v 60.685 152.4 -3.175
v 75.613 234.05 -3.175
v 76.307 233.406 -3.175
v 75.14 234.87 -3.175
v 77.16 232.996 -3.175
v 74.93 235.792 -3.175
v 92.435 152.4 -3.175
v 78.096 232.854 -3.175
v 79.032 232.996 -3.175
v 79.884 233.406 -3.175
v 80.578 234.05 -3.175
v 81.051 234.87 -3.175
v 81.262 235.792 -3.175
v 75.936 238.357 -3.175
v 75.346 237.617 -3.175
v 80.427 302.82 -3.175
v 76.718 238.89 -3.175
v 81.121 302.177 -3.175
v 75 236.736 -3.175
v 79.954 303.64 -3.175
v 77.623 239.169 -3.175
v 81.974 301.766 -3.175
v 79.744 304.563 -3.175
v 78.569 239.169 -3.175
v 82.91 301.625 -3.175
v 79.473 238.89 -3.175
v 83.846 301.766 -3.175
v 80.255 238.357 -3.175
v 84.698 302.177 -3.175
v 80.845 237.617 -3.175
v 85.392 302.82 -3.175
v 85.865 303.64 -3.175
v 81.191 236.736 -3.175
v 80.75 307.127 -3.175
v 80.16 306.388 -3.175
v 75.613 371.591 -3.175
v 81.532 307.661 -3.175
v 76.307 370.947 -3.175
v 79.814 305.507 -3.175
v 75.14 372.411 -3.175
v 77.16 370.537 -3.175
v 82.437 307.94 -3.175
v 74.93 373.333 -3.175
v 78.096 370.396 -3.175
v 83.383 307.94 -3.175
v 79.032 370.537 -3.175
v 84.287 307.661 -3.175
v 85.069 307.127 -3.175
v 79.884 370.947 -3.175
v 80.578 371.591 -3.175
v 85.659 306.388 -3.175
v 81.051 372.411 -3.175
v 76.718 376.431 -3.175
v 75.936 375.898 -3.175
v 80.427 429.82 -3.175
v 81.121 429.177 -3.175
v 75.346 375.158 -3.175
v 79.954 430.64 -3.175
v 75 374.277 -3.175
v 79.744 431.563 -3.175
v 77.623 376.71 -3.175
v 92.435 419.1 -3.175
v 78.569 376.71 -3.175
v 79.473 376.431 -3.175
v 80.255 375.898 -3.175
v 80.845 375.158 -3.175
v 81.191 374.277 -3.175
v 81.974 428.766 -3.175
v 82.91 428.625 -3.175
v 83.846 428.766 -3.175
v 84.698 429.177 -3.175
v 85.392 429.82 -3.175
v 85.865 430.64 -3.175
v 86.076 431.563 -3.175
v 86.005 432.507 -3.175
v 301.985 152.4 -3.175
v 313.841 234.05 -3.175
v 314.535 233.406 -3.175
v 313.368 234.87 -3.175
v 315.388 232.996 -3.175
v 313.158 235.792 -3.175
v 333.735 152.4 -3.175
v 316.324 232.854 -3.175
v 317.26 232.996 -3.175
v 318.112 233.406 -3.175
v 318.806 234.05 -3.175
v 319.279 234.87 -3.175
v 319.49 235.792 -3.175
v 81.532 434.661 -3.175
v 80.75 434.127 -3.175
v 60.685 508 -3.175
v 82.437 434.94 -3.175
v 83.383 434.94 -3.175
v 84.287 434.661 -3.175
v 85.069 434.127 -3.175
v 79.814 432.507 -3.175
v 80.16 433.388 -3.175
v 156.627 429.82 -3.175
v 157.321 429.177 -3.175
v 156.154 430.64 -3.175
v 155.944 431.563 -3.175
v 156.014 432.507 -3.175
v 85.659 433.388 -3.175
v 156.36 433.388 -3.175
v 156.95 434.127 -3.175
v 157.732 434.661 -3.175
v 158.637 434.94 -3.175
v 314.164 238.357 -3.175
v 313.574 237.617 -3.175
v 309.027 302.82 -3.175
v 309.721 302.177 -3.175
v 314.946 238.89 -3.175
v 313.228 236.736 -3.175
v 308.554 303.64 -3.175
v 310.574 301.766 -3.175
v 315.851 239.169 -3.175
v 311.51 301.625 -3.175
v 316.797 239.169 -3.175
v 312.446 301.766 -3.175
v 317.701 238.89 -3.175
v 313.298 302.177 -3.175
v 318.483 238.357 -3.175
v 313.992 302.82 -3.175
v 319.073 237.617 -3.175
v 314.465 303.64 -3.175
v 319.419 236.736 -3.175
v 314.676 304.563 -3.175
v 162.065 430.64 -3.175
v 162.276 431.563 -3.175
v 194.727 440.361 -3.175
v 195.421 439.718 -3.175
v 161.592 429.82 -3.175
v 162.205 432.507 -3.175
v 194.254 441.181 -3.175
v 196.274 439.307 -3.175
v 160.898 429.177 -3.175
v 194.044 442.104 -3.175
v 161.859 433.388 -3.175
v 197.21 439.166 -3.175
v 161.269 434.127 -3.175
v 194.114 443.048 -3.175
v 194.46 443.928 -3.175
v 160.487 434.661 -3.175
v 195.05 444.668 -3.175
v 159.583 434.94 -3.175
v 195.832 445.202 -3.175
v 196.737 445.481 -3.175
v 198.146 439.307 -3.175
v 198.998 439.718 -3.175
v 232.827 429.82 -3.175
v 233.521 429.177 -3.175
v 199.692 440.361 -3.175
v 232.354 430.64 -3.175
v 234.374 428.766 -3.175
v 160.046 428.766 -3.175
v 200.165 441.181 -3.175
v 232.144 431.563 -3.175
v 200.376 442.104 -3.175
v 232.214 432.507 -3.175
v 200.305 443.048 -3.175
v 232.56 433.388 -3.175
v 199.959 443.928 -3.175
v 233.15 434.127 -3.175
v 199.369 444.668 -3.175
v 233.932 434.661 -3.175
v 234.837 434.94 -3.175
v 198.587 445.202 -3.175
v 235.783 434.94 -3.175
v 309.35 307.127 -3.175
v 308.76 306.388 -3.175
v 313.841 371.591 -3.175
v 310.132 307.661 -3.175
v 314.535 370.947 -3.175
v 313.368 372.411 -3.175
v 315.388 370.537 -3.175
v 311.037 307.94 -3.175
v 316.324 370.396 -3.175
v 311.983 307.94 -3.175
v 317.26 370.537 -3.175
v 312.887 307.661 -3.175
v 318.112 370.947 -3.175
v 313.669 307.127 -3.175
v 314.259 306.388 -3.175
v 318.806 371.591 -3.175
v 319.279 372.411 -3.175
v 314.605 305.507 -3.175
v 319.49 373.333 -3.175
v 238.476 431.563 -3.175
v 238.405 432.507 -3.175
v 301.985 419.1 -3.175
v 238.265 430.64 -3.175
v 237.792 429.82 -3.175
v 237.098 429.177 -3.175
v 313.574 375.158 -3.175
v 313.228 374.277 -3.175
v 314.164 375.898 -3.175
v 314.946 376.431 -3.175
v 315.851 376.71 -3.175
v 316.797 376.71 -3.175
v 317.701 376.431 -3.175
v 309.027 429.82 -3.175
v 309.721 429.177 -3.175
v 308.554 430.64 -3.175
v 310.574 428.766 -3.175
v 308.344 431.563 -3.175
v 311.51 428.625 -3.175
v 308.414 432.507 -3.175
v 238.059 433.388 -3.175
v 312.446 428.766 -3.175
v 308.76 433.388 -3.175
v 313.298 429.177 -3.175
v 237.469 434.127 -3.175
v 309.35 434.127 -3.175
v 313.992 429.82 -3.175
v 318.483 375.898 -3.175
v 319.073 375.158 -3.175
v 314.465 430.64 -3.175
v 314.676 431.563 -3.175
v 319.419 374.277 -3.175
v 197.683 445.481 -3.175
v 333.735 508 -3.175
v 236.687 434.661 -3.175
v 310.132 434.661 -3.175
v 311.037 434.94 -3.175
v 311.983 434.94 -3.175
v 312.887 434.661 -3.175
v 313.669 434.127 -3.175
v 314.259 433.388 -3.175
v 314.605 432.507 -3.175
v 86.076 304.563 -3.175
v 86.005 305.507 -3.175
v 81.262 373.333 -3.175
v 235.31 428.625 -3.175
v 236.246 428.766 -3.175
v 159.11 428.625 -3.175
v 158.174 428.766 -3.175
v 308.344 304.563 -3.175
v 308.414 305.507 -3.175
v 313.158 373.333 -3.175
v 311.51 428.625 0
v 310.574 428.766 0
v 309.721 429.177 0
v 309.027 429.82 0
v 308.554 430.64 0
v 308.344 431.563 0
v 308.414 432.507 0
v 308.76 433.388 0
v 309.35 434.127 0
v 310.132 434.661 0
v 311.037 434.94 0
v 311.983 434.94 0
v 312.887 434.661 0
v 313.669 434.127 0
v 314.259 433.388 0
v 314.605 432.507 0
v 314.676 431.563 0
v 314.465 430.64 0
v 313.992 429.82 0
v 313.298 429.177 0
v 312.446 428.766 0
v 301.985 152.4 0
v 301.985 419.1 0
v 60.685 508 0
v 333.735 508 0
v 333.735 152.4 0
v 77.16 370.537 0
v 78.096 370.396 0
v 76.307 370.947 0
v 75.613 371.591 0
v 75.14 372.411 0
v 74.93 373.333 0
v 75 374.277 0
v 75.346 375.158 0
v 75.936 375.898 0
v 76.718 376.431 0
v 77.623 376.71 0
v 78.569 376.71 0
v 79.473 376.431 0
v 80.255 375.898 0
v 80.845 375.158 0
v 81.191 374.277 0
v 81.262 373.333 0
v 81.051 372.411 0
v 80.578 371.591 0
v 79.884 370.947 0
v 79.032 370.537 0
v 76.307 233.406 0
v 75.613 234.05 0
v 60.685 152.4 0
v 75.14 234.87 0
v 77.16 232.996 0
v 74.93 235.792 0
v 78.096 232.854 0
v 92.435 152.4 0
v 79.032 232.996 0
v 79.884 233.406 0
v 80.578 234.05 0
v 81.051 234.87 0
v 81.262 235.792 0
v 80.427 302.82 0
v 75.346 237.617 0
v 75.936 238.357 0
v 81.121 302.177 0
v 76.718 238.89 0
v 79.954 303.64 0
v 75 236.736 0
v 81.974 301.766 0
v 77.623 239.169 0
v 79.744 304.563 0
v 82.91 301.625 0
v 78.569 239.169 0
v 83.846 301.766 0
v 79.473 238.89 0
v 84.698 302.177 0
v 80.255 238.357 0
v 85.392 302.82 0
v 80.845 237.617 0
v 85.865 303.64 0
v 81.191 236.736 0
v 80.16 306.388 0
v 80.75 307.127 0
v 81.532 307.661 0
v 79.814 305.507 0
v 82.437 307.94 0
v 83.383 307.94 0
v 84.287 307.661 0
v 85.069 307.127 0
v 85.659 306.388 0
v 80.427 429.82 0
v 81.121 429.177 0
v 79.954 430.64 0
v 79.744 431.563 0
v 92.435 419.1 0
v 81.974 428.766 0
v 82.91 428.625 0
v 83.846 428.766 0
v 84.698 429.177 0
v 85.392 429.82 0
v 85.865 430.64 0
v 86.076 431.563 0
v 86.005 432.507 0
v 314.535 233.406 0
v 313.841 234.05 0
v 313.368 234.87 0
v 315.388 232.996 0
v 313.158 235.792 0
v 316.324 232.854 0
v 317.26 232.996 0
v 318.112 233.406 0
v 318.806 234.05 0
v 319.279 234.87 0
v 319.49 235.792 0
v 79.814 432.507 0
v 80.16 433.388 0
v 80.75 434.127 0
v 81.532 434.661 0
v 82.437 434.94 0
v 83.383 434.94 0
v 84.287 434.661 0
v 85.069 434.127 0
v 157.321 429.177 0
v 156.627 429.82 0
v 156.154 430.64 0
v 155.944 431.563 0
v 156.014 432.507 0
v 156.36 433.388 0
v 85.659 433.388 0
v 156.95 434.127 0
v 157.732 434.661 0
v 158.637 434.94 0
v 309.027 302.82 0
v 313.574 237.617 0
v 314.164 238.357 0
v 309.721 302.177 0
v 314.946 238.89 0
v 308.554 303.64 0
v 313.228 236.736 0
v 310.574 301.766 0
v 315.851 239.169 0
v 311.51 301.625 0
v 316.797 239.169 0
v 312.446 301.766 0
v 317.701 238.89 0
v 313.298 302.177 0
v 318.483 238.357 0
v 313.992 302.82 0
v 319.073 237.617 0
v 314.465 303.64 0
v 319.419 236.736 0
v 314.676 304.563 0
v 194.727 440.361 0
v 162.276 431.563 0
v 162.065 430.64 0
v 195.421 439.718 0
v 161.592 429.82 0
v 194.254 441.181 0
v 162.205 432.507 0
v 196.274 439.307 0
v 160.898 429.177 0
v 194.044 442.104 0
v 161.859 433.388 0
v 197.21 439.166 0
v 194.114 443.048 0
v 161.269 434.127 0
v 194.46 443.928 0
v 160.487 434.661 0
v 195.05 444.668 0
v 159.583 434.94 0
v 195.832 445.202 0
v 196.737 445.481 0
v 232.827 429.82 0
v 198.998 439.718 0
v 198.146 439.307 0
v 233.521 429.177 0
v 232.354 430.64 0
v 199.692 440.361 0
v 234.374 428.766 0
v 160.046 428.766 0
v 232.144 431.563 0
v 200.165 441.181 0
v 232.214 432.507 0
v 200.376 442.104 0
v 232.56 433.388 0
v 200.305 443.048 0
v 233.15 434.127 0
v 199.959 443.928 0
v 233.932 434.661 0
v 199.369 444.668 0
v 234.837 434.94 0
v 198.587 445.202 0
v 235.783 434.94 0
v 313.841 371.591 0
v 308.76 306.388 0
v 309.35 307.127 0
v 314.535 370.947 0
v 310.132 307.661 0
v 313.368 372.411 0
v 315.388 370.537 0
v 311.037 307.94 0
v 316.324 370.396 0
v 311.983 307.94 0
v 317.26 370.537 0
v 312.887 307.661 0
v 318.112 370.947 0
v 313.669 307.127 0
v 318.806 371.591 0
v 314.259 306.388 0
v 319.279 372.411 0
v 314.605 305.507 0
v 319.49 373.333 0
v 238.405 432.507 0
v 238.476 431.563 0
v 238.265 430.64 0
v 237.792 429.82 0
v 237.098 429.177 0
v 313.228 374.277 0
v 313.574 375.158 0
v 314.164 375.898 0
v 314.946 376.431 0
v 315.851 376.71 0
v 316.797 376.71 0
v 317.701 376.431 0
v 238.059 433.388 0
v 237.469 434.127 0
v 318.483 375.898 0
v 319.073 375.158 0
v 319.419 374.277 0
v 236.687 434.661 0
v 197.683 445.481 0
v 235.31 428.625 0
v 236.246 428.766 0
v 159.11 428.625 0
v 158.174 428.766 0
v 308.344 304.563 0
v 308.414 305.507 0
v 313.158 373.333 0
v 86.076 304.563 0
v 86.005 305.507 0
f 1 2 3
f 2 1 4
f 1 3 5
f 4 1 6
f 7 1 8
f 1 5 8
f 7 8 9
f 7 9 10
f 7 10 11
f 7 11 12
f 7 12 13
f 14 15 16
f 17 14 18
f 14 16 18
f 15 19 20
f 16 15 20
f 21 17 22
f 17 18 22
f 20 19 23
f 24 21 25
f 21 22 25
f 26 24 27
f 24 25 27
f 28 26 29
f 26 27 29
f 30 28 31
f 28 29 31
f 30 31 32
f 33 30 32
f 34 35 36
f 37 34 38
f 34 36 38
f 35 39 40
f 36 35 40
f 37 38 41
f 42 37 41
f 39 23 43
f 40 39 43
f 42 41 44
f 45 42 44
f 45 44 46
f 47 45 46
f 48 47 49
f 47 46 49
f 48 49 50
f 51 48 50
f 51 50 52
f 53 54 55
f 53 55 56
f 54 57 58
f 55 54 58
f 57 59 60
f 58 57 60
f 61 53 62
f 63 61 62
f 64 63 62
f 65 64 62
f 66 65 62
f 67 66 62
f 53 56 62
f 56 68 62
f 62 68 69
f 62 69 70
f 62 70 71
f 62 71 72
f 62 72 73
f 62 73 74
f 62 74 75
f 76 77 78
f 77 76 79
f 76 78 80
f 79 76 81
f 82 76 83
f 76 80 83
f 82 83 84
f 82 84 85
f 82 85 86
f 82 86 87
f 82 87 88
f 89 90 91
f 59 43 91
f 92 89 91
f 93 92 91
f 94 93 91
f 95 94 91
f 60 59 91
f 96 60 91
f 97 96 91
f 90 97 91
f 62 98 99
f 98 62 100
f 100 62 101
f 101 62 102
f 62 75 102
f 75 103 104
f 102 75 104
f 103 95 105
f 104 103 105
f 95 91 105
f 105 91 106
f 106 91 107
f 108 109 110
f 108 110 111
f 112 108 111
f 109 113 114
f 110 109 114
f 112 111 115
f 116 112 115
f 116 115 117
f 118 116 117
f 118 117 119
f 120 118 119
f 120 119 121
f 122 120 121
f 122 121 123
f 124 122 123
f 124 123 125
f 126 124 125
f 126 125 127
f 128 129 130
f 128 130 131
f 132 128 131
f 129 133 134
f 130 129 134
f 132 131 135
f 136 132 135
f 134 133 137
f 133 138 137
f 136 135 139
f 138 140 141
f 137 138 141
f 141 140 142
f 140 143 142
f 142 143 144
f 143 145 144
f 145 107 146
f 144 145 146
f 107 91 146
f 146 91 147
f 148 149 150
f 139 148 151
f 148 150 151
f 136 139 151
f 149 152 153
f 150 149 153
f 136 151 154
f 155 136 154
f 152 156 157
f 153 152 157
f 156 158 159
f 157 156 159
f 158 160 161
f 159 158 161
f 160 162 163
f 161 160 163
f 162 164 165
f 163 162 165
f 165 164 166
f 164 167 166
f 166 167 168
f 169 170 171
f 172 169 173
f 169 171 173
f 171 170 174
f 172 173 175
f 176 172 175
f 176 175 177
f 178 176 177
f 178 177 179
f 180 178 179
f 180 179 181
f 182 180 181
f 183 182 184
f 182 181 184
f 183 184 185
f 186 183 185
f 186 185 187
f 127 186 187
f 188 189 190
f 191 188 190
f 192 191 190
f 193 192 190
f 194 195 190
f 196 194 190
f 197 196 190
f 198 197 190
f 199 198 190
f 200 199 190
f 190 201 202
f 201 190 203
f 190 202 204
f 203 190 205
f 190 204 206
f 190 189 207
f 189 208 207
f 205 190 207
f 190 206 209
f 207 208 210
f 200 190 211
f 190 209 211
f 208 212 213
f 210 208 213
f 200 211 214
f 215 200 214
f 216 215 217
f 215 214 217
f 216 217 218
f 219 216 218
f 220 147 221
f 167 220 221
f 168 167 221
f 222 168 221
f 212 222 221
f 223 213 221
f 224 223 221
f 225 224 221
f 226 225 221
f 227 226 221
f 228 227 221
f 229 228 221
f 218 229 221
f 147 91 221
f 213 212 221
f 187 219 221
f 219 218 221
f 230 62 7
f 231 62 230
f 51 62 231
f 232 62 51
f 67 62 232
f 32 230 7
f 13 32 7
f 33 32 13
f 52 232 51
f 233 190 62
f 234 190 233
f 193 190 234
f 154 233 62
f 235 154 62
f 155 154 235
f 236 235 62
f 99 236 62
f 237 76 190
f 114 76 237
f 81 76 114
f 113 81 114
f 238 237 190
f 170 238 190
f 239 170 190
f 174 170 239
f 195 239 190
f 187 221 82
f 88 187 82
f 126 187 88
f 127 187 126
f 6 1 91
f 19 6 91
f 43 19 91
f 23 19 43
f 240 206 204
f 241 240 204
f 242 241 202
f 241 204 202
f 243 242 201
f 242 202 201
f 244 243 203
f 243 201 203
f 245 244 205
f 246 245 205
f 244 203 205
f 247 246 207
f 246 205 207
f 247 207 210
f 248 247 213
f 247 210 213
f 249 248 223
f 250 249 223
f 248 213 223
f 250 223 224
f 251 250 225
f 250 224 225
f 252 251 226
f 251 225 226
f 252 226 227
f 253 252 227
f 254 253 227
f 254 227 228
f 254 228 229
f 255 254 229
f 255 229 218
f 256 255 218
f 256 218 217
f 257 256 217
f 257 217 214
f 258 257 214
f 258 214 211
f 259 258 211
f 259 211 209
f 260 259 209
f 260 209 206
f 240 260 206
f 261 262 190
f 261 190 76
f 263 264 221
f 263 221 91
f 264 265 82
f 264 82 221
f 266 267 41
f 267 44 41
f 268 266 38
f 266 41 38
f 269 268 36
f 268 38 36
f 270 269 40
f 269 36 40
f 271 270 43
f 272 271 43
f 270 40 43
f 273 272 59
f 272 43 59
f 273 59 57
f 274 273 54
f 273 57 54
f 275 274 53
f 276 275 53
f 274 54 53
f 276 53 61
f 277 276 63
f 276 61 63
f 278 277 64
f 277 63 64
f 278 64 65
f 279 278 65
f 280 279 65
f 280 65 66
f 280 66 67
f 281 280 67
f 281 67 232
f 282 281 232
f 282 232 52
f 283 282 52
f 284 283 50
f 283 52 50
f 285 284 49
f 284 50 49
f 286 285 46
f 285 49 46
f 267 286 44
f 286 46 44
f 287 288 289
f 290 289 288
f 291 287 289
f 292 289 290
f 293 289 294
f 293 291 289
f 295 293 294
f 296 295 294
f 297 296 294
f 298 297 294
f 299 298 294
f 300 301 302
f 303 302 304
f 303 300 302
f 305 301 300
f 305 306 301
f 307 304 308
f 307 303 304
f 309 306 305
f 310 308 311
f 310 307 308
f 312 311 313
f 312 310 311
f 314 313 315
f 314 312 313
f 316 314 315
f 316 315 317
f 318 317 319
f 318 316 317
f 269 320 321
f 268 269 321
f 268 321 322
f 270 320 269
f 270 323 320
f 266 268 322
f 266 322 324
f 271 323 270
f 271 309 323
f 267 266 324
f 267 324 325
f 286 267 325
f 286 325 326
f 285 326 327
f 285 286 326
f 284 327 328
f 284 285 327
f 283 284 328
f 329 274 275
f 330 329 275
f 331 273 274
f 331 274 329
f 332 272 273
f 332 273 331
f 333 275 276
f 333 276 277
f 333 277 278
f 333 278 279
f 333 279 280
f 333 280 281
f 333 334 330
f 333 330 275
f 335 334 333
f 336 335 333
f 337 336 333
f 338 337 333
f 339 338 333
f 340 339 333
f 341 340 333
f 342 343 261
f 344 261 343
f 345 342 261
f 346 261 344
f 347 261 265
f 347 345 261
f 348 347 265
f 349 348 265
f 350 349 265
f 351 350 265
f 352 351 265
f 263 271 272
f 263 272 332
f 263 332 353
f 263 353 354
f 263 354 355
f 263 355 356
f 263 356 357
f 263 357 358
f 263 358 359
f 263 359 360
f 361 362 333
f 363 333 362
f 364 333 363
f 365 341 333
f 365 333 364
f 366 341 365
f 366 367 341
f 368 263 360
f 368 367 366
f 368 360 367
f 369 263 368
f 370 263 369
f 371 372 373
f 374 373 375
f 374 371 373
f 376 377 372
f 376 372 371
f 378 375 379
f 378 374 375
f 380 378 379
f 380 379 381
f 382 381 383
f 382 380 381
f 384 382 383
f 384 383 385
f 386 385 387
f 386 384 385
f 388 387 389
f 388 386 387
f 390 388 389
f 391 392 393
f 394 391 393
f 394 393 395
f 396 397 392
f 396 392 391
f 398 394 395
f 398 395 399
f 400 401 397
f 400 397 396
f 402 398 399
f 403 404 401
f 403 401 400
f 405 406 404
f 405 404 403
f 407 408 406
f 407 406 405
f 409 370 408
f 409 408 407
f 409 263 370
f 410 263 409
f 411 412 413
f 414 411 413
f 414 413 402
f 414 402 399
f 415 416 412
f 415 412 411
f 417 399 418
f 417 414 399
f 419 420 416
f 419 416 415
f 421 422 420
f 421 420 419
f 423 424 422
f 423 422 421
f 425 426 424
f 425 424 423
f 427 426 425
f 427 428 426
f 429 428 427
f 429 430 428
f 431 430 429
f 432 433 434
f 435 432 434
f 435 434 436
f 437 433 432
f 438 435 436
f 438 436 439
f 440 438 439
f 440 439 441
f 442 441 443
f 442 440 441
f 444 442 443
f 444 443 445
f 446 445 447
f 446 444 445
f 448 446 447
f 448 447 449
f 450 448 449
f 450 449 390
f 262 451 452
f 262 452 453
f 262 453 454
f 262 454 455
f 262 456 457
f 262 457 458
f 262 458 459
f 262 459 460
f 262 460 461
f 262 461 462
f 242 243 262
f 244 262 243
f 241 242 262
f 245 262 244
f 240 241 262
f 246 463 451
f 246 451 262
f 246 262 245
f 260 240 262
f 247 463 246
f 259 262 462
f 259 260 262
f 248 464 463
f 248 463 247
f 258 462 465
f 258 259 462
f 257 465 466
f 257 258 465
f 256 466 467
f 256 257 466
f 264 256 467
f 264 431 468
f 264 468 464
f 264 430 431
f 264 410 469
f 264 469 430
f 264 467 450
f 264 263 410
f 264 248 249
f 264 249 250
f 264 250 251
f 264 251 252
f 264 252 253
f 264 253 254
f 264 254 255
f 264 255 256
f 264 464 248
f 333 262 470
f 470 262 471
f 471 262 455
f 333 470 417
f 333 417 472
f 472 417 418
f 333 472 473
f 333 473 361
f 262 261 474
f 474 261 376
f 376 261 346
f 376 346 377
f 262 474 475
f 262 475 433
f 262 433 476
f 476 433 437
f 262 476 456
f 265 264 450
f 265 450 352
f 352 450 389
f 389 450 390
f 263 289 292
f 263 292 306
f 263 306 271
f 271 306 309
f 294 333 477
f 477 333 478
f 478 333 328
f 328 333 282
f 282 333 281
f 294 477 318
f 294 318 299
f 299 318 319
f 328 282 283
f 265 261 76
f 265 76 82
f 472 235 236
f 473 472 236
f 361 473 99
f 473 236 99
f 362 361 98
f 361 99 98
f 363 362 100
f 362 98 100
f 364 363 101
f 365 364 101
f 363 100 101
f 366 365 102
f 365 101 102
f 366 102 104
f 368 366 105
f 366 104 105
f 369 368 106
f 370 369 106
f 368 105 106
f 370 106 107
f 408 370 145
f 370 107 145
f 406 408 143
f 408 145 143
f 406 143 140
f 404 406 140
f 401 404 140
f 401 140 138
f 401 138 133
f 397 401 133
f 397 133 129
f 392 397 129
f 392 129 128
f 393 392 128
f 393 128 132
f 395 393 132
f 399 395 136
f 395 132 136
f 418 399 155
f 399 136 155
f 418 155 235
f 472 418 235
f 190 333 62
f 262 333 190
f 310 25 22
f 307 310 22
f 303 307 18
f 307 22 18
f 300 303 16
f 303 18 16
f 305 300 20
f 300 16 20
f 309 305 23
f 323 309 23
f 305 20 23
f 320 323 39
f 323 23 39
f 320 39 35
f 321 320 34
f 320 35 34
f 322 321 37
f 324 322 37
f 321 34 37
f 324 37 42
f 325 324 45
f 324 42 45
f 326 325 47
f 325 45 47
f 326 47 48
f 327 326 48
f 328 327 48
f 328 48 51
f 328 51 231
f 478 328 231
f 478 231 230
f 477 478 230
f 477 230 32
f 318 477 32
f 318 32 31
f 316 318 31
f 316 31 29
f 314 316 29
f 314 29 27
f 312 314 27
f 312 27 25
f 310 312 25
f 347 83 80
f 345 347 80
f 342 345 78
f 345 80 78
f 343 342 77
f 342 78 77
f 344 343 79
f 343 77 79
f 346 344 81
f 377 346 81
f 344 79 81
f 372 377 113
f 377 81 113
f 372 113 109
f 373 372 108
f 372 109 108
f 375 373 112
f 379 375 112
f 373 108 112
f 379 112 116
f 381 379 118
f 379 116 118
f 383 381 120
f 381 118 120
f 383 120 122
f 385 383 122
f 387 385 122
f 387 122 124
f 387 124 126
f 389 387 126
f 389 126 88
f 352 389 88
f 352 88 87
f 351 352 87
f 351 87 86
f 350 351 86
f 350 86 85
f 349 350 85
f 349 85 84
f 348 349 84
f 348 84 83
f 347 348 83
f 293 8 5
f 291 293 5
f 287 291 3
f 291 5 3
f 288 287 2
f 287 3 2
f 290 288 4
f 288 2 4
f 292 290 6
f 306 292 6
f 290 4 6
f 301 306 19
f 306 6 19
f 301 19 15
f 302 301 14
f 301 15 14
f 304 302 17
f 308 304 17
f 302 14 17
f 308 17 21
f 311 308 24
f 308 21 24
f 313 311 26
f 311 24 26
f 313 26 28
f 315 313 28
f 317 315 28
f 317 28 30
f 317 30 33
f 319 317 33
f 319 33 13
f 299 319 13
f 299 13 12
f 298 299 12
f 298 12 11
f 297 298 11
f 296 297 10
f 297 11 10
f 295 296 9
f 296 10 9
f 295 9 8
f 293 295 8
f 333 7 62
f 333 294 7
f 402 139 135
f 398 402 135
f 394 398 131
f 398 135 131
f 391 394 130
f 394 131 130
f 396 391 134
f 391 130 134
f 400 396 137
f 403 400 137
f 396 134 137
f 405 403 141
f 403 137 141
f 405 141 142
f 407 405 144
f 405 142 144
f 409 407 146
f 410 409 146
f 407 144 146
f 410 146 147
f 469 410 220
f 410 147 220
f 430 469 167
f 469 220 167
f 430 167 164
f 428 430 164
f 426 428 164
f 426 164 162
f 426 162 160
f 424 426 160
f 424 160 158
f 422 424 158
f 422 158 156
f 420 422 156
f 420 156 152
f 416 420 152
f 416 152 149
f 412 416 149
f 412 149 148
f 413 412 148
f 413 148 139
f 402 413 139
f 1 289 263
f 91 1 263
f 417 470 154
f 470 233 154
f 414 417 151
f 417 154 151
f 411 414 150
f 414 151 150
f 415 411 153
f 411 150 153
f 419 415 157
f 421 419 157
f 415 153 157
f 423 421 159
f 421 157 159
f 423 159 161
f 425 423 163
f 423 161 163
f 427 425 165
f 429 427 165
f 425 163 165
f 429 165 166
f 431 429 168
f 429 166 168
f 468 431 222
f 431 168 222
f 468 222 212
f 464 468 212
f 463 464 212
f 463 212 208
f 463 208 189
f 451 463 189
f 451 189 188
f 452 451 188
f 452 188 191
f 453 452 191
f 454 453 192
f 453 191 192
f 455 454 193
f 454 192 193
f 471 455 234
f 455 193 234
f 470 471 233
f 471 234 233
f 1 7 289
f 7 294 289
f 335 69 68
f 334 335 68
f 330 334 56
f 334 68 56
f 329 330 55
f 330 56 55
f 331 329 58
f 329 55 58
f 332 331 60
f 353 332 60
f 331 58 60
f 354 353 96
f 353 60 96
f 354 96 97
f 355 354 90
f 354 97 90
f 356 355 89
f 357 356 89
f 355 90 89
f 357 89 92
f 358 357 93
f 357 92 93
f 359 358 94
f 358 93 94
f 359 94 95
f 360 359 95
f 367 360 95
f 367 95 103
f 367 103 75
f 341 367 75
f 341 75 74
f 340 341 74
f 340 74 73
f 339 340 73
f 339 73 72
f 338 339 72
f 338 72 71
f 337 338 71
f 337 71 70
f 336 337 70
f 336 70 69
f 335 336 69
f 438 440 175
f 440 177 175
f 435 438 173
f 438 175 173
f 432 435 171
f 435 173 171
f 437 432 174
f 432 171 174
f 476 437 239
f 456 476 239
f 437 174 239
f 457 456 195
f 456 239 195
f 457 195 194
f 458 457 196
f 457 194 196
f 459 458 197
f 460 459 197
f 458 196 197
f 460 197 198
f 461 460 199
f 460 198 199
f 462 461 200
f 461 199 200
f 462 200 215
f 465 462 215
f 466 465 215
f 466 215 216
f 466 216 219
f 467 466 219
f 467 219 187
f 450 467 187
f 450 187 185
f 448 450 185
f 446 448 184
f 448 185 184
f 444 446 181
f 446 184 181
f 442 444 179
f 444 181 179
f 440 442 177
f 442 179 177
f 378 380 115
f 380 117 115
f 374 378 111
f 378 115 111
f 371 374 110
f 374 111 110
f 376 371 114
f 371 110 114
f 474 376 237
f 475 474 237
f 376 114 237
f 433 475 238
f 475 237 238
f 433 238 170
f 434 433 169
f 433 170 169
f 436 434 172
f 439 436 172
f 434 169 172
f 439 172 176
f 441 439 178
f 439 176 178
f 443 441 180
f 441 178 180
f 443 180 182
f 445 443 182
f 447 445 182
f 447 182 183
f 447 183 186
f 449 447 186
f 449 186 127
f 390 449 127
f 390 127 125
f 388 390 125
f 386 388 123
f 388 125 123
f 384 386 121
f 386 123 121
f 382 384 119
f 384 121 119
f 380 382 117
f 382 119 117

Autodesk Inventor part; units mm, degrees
ref_plane "YZ Plane" through (0, 0, 0) normal (1, 0, 0) x (0, 1, 0)
ref_plane "XZ Plane" through (0, 0, 0) normal (0, 1, 0) x (-1, 0, 0)
ref_plane "XY Plane" through (0, 0, 0) normal (0, 0, 1) x (1, 0, 0)
sketch "Sketch1" plane through (0, 0, 0) normal (0, 0, 1) x (1, 0, 0)
  line L0 (333.7348, 152.4) -> (333.7348, 508)
  line L1 (92.4348, 152.4) -> (92.4348, 419.1)
  line L2 (92.4348, 419.1) -> (301.9848, 419.1)
  line L3 (301.9848, 419.1) -> (301.9848, 152.4)
  line L4 (301.9848, 152.4) -> (333.7348, 152.4)
  line L5 (92.4348, 152.4) -> (60.6848, 152.4)
  line L6 (60.6848, 152.4) -> (60.6848, 508)
  line L7 (333.7348, 508) -> (60.6848, 508)
  point P0 (0, 0)
  point P1 (197.2098, 304.8)
  point P2 (197.2098, 442.341)
  point P3 (78.0958, 373.5705)
  point P4 (78.0958, 236.0295)
  point P5 (197.2098, 167.259)
  point P6 (316.3238, 236.0295)
  point P7 (316.3238, 373.5705)
  point P8 (311.5098, 304.8)
  point P9 (311.5098, 431.8)
  point P10 (82.9098, 431.8)
  point P11 (82.9098, 304.8)
  point P12 (235.3098, 431.8)
  point P13 (159.1098, 431.8)
  dimension "d1" = 355.6
  dimension "d4" = 137.541
  dimension "d7" = 360
  dimension "d9" = 31.75
  dimension "d21" = 31.75
  dimension "d23" = 114.3
  dimension "d39" = 127
  dimension "d40" = 127
  dimension "d48" = 22.225
  dimension "d49" = 22.225
  dimension "d54" = 209.55
  dimension "d55" = 266.7
  dimension "d56" = 104.775
  dimension "d57" = 152.4
  dimension "d58" = 152.4
extrude "Extrusion1" add sketch "Sketch1" against normal blind 3.175
hole "Hole1" at (197.2098, 304.8, 0) at (197.2098, 442.341, 0) at (78.0958, 373.5705, 0) at (78.0958, 236.0295, 0) at (197.2098, 167.259, 0) at (316.3238, 236.0295, 0) at (316.3238, 373.5705, 0) direction (0, 0, -1) diameter 6.35 depth 25.4 tip angle 118
hole "Hole3" at (311.5098, 304.8, 0) at (311.5098, 431.8, 0) at (82.9098, 431.8, 0) at (82.9098, 304.8, 0) at (159.1098, 431.8, 0) at (235.3098, 431.8, 0) direction (0, 0, -1) diameter 6.35 depth 25.4 tip angle 118
properties part number "top mid-pivot plate"
